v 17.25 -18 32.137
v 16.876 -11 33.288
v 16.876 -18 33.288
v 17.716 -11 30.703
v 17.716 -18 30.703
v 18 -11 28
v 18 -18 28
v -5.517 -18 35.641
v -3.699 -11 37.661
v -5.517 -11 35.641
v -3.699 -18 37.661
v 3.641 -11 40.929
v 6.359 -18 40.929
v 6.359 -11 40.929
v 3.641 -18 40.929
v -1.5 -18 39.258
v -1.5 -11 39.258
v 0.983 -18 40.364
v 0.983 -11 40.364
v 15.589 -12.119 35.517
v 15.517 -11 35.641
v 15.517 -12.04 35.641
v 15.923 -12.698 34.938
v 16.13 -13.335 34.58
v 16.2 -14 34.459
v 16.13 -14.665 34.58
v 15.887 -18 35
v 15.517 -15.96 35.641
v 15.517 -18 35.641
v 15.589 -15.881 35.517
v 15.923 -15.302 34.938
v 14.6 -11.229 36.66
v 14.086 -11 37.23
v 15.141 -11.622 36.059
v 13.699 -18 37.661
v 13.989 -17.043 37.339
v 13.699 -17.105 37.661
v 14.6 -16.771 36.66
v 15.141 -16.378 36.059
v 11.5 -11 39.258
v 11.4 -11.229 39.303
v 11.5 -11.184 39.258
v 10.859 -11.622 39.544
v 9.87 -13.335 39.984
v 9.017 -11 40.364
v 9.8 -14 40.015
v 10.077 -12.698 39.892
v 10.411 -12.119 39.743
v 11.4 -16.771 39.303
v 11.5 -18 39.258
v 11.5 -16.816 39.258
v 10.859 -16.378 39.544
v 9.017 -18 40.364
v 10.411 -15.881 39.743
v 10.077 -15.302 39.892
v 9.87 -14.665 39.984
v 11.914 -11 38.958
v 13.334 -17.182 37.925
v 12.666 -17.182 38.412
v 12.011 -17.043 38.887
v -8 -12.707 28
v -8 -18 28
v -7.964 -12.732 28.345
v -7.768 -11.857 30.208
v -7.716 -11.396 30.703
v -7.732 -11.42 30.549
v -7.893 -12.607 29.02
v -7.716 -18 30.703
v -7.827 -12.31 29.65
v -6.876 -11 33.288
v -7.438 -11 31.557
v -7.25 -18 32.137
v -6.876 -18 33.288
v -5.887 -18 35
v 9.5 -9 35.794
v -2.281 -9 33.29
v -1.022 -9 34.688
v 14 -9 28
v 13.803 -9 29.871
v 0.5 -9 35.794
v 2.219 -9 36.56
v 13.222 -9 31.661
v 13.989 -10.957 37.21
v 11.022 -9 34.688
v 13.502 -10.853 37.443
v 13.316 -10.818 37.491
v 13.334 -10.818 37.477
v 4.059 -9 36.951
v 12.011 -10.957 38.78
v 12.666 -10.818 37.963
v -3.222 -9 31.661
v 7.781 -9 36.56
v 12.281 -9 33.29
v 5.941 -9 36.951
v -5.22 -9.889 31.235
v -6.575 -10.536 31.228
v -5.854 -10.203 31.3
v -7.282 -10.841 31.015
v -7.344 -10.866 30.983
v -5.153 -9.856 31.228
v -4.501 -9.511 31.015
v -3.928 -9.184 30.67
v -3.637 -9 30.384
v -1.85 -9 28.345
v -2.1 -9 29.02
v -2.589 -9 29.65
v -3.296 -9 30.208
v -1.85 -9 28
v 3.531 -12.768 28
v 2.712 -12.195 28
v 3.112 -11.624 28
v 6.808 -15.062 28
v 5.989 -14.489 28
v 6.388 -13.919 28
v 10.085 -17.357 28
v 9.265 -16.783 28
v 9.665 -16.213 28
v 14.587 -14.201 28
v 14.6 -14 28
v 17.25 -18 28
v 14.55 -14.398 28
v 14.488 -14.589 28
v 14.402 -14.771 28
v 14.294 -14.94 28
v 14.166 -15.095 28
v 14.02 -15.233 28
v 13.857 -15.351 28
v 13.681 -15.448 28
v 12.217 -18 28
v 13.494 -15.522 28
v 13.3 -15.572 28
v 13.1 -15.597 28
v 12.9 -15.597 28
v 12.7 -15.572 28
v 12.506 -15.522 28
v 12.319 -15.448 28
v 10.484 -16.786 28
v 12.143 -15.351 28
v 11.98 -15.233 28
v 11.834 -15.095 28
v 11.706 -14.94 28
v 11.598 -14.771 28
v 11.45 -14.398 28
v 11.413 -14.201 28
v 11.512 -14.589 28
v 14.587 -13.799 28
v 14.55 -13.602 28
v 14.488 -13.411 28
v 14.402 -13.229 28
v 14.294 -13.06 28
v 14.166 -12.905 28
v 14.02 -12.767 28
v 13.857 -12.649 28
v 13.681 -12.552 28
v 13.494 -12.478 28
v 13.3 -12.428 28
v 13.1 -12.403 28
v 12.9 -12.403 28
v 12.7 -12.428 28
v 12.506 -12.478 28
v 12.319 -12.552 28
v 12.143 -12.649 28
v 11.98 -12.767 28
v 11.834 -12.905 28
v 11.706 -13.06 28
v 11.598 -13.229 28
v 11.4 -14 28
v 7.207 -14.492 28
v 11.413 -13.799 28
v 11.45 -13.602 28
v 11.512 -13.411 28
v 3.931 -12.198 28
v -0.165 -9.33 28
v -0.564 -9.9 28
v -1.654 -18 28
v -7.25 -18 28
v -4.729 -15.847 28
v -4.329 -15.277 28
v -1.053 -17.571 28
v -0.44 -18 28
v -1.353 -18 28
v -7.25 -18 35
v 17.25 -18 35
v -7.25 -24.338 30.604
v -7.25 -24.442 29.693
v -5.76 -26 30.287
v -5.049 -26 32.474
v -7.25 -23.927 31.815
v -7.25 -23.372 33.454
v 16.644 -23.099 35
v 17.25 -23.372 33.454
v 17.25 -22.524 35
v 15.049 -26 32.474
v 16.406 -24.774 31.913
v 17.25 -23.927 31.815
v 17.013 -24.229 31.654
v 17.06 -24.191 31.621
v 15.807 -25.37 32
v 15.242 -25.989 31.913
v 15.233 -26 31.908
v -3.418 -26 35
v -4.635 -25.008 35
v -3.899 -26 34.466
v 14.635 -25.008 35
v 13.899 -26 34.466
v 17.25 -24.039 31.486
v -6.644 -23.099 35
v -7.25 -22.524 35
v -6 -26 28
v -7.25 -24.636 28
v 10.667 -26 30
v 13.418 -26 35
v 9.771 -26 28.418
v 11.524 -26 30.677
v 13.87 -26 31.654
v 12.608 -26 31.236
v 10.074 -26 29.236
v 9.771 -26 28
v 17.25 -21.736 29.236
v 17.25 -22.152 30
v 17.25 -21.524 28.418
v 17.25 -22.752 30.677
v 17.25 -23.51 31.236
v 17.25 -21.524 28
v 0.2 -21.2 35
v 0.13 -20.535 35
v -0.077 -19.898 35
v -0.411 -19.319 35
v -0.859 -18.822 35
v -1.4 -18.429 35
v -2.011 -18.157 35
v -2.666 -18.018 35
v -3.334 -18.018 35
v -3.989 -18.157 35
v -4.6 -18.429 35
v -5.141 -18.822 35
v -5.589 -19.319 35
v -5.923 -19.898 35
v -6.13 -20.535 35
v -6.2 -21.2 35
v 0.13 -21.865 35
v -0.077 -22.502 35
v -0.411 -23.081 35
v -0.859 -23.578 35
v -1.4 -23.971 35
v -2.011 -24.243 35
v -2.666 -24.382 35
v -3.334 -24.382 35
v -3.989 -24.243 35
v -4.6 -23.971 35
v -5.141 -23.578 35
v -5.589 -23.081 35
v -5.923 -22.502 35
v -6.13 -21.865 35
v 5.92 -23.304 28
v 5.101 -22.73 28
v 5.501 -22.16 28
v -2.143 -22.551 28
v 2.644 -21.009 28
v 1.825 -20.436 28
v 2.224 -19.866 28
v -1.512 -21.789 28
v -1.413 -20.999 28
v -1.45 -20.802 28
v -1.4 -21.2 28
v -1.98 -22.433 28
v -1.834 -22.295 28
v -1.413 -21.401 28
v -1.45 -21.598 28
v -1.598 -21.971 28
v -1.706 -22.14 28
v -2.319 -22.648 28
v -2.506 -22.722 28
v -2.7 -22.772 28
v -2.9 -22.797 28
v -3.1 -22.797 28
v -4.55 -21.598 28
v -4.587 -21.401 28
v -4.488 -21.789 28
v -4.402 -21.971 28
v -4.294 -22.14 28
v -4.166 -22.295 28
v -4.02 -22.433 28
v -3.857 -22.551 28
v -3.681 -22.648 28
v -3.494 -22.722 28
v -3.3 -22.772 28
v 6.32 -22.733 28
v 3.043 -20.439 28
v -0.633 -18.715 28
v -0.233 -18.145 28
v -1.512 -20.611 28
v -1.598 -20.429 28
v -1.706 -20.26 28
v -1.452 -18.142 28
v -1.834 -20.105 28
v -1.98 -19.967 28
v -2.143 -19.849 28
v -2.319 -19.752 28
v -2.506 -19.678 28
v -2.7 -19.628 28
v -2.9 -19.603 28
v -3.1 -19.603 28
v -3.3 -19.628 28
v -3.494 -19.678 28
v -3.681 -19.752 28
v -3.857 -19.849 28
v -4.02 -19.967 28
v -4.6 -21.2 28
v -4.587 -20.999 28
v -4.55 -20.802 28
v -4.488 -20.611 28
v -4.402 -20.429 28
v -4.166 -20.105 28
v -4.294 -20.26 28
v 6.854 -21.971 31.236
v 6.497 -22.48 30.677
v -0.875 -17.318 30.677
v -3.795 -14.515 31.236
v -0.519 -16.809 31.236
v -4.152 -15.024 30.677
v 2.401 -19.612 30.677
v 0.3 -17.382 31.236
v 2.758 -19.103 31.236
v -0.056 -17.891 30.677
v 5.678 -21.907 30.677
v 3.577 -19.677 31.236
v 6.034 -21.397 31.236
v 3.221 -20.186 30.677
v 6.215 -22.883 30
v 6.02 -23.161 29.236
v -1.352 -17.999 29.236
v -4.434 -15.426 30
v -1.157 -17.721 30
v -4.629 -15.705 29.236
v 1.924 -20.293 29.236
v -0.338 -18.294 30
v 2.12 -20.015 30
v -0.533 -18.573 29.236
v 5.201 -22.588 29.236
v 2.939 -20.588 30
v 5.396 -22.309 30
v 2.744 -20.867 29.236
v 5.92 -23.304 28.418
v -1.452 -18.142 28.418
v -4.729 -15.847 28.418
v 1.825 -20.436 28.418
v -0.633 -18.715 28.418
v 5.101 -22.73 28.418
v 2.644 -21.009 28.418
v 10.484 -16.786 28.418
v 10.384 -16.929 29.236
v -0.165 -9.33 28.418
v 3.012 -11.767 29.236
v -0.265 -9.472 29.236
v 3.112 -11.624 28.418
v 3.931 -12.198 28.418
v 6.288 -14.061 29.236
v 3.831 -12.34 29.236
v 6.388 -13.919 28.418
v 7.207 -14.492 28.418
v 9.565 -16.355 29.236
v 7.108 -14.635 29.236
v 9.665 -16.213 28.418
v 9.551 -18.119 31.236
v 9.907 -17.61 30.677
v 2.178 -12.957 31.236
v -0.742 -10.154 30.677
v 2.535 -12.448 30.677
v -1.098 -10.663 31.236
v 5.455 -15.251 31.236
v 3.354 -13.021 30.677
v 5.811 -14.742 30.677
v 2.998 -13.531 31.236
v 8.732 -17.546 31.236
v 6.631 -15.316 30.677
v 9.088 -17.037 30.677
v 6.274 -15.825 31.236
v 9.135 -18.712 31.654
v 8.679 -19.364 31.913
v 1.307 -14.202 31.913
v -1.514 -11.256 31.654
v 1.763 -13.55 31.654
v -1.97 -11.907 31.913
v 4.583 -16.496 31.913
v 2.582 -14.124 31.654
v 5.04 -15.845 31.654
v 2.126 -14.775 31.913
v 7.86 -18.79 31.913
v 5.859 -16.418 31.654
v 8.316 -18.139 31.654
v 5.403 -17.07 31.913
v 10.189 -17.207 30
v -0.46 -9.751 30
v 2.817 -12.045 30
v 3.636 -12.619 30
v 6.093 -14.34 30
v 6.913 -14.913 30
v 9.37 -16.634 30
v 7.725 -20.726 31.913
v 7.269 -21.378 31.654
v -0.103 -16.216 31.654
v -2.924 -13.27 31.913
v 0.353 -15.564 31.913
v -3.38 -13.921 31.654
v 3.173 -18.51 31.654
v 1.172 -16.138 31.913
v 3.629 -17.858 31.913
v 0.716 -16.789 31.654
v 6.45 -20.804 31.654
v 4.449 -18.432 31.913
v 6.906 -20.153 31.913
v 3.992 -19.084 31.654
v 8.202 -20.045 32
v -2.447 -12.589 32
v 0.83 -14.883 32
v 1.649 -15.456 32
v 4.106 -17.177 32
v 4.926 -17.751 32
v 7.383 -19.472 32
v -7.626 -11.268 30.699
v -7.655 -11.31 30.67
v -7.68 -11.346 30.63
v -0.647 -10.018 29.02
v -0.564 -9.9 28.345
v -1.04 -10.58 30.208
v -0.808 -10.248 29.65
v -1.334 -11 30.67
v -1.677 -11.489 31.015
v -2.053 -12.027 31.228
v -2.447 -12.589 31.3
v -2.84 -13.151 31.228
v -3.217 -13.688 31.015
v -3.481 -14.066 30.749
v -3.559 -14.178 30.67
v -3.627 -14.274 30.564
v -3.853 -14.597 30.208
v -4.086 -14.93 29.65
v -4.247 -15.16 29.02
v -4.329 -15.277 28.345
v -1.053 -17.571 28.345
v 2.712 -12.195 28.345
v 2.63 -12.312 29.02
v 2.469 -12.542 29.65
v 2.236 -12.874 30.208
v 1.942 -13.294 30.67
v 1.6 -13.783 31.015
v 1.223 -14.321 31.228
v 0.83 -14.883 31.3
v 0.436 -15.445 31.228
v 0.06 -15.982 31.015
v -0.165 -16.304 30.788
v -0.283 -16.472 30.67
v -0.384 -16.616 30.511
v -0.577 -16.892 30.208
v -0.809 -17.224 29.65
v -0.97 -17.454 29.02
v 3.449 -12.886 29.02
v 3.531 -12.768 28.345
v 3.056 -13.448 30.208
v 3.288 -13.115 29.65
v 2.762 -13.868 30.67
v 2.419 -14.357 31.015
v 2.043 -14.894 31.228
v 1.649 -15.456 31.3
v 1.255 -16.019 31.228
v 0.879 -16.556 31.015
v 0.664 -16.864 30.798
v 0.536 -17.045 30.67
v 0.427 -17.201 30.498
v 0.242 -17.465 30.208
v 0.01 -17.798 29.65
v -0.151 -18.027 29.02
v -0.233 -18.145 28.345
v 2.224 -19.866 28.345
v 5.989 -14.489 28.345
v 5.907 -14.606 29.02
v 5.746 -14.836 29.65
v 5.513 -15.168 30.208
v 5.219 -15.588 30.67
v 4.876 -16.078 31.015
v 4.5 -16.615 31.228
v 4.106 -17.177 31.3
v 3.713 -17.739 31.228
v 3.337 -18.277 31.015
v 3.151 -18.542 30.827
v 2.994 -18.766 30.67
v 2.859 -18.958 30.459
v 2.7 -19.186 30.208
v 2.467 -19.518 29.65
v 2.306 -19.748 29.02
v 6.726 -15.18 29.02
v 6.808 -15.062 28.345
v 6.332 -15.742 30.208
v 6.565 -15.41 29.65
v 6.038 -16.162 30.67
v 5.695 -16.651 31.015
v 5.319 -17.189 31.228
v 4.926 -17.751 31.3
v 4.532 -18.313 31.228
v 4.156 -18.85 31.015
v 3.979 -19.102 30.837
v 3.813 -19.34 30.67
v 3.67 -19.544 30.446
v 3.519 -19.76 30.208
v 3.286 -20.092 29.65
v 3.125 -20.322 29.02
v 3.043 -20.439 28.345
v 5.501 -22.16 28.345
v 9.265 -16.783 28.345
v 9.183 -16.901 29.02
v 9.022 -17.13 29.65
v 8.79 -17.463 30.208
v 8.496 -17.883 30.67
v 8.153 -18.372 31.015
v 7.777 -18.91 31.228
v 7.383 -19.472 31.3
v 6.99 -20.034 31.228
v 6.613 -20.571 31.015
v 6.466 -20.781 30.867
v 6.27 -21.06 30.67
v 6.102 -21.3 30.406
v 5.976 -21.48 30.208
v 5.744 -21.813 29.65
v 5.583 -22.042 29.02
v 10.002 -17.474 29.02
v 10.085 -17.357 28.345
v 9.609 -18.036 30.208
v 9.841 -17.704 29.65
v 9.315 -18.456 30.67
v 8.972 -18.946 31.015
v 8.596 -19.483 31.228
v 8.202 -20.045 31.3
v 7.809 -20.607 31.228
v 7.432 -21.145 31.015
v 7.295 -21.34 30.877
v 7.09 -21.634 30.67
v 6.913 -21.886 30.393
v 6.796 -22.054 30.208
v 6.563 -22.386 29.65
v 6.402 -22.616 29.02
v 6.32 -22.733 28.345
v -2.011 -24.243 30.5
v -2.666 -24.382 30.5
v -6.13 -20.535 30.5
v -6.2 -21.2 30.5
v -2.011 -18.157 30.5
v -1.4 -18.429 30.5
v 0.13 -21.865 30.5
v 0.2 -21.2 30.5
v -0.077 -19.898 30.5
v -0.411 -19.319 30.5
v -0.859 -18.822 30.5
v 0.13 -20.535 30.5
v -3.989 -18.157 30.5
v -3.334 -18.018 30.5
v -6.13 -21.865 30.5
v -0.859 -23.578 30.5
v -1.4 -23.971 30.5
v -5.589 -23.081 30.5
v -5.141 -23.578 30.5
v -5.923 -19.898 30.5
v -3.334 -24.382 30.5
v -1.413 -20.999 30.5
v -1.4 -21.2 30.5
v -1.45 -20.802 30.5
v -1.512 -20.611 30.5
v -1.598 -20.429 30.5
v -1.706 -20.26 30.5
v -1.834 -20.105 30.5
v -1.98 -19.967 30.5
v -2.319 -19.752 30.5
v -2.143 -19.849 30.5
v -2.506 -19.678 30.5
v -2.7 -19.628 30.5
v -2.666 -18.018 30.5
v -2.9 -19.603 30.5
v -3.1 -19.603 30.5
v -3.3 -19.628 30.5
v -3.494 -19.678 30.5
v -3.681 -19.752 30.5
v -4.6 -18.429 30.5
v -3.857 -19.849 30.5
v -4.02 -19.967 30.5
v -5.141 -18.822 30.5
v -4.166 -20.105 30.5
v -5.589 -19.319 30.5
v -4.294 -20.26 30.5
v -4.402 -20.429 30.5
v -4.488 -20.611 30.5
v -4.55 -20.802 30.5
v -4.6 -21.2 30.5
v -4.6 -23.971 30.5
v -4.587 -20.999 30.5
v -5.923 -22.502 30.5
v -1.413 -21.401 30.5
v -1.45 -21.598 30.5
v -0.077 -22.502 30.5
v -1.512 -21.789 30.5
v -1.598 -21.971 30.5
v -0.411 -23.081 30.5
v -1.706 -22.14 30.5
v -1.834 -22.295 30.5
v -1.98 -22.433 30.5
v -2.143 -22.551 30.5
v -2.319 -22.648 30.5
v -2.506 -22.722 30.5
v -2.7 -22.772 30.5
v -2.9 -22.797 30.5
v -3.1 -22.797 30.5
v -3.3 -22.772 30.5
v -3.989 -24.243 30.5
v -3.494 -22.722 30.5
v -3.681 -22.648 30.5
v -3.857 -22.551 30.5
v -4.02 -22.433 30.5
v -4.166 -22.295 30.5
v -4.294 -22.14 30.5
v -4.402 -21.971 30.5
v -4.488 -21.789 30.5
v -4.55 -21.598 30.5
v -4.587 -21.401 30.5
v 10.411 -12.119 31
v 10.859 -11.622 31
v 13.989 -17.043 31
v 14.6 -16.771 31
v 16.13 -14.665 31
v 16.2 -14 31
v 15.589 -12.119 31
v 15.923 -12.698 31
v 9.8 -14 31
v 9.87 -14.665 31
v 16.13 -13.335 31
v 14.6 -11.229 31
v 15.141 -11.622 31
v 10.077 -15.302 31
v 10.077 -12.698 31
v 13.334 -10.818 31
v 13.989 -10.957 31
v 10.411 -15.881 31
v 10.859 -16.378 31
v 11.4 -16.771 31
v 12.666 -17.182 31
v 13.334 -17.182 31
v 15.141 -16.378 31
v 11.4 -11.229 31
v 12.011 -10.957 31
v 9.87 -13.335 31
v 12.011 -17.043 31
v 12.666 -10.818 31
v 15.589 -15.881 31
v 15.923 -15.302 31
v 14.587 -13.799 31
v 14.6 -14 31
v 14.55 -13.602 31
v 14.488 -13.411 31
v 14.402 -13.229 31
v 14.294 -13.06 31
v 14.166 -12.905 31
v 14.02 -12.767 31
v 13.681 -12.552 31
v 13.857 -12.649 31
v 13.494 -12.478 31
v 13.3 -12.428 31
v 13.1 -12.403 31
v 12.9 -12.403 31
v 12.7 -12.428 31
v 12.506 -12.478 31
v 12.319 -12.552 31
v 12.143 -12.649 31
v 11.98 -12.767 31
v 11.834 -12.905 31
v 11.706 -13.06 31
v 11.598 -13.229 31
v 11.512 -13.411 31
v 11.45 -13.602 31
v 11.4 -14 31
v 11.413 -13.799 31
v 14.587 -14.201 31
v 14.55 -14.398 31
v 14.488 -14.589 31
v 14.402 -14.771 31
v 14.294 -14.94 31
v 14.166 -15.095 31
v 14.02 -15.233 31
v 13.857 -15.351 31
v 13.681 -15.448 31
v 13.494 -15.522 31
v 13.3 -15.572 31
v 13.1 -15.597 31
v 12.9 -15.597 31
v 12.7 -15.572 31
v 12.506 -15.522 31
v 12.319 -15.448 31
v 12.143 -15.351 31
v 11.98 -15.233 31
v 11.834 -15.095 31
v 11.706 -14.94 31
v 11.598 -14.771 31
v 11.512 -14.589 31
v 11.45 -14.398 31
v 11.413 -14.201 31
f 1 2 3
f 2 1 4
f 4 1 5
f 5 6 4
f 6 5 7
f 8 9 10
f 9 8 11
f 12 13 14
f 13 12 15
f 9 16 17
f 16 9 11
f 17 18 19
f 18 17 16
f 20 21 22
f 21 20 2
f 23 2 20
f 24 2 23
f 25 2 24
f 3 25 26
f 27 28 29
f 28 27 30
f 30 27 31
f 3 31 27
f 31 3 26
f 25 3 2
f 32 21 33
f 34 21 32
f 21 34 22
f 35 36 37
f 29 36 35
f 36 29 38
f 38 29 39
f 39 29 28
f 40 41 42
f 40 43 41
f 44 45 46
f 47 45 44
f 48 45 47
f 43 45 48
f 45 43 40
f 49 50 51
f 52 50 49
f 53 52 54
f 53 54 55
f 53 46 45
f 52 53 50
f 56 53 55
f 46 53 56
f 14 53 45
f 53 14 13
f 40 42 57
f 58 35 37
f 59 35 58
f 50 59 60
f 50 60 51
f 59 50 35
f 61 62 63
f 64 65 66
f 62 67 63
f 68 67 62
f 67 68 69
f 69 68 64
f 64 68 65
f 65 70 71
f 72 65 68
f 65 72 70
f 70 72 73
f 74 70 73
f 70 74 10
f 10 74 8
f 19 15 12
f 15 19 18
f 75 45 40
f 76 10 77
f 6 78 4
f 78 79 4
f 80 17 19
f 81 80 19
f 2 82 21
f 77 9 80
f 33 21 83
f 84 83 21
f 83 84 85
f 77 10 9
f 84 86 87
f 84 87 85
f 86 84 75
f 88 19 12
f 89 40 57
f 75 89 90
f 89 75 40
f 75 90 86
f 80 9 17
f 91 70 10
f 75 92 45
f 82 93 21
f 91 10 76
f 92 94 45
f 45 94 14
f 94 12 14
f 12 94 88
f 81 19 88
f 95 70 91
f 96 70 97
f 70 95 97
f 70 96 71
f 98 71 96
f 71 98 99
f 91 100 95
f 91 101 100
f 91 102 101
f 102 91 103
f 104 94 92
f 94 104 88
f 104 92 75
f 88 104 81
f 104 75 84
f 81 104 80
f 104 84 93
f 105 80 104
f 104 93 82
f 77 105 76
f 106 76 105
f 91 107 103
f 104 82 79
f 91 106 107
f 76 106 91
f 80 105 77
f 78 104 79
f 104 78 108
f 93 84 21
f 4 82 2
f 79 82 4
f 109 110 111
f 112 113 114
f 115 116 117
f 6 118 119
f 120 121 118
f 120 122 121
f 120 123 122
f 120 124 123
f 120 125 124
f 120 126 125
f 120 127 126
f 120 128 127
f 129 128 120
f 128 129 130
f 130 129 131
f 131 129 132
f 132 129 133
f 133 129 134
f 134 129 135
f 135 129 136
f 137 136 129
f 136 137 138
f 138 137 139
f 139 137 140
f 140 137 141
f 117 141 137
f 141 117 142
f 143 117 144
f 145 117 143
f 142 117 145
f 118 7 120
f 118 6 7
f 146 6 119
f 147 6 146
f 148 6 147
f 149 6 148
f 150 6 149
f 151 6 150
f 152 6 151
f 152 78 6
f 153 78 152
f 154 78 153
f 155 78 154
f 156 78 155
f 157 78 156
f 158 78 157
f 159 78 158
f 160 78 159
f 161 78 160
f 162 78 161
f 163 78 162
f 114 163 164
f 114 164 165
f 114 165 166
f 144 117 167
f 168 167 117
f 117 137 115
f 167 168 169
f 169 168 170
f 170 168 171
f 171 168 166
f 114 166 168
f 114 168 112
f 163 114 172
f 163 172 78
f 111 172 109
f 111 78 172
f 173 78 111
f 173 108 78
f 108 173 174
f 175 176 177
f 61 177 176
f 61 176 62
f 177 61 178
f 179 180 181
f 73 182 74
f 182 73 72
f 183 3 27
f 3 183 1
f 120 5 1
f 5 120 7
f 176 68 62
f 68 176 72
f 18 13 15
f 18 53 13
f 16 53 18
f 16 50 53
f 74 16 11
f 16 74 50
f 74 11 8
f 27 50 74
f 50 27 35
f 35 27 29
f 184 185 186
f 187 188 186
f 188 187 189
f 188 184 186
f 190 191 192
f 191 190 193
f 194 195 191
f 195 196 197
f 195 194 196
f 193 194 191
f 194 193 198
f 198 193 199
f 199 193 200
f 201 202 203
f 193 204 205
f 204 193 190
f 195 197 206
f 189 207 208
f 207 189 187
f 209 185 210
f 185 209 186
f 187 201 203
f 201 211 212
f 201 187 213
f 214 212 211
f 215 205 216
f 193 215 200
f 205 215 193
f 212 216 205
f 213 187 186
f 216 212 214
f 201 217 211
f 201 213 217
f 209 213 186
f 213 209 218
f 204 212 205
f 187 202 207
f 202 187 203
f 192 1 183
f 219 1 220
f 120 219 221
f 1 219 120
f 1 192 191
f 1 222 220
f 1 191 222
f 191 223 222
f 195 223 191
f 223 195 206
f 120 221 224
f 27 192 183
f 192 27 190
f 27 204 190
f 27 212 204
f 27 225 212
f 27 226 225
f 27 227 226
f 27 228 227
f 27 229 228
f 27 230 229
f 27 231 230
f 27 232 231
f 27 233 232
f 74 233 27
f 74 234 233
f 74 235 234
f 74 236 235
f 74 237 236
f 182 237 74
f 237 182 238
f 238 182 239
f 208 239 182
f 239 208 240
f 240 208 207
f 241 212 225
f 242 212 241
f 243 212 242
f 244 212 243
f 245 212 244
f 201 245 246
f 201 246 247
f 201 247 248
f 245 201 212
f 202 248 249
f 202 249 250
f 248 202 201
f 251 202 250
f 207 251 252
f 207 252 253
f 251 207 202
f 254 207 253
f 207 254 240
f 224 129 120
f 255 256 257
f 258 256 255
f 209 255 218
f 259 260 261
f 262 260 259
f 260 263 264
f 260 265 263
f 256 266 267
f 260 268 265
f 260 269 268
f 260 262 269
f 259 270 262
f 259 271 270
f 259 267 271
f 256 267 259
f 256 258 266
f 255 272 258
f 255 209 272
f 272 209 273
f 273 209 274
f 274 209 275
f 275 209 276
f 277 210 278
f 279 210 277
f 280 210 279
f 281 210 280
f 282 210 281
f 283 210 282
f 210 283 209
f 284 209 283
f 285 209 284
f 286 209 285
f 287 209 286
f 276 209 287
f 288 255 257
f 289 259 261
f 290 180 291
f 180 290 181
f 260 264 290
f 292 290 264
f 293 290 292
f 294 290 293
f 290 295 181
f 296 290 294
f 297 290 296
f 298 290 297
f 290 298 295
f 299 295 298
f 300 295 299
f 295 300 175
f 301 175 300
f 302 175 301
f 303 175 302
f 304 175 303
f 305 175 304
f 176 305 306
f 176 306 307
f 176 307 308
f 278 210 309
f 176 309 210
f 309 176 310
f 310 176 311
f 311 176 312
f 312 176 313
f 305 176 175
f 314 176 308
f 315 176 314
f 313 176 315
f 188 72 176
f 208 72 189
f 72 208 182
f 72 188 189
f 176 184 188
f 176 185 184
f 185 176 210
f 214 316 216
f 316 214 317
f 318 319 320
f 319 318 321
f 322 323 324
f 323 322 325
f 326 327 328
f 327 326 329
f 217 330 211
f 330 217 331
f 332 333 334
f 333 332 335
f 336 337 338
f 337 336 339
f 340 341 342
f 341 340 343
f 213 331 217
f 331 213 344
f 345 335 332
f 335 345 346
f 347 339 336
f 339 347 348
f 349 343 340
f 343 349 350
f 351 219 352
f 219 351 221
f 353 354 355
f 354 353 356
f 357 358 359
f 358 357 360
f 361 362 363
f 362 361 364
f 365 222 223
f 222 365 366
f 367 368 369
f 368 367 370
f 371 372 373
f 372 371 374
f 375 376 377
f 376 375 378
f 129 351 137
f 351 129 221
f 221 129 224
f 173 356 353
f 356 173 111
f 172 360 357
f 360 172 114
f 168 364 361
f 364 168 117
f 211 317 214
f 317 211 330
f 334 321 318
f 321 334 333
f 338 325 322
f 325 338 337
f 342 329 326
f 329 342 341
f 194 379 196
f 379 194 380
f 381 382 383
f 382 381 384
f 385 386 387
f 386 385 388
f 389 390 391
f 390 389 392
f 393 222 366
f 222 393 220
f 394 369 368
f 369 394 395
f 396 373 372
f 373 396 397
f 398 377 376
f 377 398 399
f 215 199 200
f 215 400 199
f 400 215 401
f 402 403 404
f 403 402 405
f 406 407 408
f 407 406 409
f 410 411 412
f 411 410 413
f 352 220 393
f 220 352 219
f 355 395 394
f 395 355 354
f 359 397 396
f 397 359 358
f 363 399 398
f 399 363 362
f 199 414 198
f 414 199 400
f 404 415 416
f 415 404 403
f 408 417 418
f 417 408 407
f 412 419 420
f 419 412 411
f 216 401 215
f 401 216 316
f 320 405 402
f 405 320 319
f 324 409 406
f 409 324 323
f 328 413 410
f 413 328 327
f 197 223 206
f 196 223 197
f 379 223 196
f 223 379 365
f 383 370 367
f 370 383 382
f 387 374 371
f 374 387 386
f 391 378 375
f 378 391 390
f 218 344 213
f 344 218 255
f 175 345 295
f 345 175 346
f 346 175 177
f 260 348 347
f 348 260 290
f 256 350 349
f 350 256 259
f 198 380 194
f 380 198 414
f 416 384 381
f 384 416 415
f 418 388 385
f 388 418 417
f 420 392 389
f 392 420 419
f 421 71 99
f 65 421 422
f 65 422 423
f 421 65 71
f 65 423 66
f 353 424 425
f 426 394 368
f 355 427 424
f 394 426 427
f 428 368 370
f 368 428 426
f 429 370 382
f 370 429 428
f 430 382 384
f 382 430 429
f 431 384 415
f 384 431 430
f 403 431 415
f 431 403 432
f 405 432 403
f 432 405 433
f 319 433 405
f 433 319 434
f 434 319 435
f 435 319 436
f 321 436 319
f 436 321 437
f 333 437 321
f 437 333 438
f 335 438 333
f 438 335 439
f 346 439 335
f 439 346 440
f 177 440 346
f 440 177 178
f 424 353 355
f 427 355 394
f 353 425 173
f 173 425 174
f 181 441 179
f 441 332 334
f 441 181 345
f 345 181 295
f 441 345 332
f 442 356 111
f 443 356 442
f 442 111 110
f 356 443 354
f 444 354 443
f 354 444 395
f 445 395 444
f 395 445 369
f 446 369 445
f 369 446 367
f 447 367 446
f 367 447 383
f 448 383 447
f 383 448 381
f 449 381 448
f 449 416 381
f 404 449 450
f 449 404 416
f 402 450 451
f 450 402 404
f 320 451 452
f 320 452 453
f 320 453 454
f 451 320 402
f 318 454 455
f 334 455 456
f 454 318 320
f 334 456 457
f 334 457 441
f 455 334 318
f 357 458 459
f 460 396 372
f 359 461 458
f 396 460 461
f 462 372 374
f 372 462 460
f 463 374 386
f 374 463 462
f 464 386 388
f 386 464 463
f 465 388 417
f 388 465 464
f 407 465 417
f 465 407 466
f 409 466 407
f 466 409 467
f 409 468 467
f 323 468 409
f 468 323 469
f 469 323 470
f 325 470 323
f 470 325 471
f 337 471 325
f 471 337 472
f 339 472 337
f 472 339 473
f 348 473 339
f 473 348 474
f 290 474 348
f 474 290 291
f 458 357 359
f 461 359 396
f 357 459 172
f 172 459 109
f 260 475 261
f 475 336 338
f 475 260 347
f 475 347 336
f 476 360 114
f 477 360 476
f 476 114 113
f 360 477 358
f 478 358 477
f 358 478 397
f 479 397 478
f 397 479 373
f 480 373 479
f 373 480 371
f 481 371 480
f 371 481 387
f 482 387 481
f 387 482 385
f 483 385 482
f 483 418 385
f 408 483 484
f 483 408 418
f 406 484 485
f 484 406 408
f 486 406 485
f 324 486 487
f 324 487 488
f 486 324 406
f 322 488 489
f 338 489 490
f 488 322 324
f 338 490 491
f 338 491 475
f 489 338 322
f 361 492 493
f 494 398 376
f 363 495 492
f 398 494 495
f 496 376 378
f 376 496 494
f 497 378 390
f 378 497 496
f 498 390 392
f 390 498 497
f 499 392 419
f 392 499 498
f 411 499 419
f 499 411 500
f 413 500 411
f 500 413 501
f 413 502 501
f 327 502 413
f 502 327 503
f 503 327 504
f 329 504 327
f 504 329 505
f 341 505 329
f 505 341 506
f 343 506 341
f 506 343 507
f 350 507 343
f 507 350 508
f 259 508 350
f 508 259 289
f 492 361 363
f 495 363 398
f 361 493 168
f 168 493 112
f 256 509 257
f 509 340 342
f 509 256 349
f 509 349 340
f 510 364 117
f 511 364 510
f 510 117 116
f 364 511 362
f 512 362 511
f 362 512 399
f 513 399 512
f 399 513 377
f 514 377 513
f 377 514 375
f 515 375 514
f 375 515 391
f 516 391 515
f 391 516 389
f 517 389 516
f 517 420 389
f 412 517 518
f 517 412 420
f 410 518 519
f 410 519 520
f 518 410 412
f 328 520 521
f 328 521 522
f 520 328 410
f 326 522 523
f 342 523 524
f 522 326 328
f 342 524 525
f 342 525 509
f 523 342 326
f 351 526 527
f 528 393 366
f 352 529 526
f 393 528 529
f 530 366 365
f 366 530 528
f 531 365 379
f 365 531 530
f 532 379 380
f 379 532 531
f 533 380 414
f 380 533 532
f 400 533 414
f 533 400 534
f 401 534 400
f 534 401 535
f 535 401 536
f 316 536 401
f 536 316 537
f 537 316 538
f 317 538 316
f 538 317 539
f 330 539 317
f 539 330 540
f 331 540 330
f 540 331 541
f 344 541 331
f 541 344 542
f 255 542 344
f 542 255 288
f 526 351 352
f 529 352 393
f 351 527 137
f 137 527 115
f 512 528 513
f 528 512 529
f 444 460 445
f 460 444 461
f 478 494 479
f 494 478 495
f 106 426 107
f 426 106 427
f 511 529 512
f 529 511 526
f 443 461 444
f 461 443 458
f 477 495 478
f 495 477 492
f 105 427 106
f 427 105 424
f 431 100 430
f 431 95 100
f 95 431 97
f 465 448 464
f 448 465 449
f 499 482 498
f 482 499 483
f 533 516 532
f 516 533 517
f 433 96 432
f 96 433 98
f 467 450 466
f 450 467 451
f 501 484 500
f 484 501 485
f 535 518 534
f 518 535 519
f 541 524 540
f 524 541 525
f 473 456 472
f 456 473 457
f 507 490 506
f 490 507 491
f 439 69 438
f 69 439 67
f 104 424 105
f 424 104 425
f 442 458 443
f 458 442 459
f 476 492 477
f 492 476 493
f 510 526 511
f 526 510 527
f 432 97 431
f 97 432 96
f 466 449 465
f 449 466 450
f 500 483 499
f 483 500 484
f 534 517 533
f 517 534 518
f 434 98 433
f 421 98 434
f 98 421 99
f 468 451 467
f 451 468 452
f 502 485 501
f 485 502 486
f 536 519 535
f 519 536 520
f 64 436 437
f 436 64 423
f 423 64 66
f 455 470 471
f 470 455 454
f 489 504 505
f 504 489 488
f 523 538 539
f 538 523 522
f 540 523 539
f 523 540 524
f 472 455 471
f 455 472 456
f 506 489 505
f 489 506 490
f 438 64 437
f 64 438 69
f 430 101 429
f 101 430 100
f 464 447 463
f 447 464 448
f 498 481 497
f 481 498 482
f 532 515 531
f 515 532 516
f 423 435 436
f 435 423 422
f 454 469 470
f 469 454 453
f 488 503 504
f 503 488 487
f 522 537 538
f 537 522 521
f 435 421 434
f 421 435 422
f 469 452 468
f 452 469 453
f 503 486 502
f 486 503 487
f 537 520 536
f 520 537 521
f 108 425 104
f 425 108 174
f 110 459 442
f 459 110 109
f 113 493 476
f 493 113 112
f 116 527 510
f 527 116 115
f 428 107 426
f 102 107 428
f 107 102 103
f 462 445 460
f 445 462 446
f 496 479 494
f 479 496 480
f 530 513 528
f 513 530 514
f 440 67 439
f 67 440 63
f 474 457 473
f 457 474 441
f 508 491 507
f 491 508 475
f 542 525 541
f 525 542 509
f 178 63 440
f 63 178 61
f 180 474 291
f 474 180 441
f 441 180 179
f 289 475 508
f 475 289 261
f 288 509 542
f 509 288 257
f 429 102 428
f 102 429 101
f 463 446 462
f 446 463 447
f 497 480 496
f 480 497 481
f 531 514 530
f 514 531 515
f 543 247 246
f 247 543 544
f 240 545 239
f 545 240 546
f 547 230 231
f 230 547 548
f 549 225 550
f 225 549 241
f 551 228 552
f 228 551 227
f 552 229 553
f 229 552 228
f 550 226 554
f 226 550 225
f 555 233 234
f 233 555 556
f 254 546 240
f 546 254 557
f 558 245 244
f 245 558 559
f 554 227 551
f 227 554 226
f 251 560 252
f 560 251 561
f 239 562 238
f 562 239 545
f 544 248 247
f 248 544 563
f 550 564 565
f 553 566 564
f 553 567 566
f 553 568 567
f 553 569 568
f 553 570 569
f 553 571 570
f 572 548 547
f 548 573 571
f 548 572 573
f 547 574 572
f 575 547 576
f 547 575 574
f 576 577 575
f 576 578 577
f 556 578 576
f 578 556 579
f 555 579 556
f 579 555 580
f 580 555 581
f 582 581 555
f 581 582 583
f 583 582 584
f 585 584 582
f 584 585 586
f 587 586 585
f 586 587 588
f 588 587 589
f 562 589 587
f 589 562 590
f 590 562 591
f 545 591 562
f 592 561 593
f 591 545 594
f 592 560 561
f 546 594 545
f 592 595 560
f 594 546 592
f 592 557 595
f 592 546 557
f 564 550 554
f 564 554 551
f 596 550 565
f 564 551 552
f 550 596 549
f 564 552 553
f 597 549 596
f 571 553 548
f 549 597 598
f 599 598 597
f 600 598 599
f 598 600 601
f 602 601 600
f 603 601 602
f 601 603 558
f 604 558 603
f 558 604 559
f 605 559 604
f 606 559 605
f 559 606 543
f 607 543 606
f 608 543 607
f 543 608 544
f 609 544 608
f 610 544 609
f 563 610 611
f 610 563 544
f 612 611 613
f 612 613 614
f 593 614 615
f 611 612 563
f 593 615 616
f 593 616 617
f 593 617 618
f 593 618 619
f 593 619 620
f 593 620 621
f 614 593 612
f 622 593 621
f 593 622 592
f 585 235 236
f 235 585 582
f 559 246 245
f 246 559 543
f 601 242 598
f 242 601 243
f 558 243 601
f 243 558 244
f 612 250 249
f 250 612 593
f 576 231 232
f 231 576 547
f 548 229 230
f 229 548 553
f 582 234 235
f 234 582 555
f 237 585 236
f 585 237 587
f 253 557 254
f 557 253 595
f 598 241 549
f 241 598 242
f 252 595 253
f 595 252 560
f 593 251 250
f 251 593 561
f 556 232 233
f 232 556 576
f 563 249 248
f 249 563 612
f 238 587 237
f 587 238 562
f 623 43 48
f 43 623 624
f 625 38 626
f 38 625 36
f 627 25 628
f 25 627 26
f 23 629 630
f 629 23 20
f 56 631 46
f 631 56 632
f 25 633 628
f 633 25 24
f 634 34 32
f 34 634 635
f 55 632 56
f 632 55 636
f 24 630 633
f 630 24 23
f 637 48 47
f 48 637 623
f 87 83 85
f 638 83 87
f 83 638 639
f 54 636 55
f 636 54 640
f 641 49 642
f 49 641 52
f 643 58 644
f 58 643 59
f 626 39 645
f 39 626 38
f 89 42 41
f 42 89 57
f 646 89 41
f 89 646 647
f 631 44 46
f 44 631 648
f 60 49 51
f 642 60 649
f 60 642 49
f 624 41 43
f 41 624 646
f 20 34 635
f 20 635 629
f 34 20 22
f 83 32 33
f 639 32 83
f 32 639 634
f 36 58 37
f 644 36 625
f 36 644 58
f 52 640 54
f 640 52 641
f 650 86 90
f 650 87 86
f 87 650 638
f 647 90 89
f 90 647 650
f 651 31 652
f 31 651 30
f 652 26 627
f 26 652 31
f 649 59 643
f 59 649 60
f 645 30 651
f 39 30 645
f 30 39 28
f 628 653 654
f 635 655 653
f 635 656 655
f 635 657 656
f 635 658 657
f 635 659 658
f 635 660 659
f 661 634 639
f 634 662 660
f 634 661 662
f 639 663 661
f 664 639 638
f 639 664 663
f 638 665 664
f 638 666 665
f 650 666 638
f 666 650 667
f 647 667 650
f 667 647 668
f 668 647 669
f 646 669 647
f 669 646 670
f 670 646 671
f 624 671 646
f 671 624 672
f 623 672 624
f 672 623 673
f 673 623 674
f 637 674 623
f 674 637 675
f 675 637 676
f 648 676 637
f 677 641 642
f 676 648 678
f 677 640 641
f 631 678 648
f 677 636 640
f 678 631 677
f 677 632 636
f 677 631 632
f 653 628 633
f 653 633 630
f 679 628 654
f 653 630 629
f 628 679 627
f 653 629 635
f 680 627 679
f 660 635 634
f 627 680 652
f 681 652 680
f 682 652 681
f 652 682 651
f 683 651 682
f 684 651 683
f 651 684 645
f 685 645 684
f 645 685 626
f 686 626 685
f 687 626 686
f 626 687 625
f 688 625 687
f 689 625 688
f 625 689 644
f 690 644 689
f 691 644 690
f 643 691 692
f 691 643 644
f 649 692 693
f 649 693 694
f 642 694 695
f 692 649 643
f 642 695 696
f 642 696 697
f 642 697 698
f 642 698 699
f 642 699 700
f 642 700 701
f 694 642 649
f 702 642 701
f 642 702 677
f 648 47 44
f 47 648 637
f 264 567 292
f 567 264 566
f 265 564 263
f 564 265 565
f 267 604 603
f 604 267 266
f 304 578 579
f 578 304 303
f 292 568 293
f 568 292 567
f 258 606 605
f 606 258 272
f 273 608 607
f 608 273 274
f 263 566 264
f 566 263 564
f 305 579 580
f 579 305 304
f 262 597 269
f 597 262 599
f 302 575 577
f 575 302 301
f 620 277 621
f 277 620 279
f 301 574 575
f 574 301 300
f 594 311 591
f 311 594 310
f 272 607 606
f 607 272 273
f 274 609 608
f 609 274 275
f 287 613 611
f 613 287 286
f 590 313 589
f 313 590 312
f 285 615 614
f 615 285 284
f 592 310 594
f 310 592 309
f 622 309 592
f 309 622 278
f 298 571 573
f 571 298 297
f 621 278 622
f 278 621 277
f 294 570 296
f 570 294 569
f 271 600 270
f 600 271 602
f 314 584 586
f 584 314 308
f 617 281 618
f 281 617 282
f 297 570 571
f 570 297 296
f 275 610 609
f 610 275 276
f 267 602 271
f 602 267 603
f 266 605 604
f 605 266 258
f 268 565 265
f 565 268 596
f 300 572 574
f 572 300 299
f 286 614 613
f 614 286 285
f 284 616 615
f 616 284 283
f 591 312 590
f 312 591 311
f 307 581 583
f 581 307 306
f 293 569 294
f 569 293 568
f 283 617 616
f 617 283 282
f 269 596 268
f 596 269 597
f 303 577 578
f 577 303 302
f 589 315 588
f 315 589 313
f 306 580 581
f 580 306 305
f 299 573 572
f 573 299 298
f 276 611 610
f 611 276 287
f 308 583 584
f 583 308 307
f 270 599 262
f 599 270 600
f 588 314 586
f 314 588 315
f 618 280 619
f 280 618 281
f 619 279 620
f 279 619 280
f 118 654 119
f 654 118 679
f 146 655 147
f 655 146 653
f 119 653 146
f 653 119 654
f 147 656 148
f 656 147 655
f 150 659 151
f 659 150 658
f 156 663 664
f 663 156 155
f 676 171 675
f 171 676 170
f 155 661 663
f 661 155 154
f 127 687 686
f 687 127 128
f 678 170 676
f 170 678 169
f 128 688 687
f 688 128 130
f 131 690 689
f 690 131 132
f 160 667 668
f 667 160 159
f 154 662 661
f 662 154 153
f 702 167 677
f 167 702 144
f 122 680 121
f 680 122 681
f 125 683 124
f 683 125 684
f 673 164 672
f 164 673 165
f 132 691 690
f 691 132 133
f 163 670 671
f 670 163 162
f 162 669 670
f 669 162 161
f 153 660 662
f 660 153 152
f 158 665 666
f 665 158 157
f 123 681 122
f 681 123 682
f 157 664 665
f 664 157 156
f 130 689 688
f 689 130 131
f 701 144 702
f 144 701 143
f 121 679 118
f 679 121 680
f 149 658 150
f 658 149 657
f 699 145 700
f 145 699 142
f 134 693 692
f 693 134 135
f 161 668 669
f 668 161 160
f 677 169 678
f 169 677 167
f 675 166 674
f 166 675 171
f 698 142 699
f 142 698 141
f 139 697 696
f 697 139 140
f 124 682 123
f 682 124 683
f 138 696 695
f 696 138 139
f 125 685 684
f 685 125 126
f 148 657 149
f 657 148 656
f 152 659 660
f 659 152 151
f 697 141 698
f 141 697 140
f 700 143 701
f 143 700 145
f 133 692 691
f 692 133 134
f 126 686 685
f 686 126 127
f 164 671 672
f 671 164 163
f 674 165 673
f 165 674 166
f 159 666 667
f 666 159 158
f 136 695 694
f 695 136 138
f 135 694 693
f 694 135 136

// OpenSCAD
// PRUSA iteration4
// Heatbed cable clip
// GNU GPL v3
// Josef Průša <iam@josefprusa.cz> and contributors
// http://www.reprap.org/wiki/Prusa_Mendel
// http://prusamendel.org

module heatbed_cable_clip(){
    difference(){
        union(){
            difference(){
                union(){
                    // Body base
                    translate([75,99,28]) rotate([90,0,0]) cylinder(h=15,r=13,$fn=30);
                    translate([75,101,28]) rotate([90,0,0]) cylinder(h=2,r1=9,r2=13,$fn=30);
                }

                // Cut flat and shape
                translate([60,82,14]) cube([30,20,14]);
                translate([60,72,20]) cube([30,20,30]);
            }
            difference(){
                translate([62.75,84,28]) cube([24.5,8,7]);
                difference(){
                    translate([75,85,28]) rotate([90,0,0]) cube([30,20,10],center=true);
                    translate([75,90,28]) rotate([90,0,0]) cylinder(h=6,r1=16.5,r2=11,$fn=30);
                }
            }
        }

        // Cable opening
        translate([61,102,28]) rotate([35,90,0])

        difference(){
            cylinder(h=35,r=4,$fn=30);

            translate([0,0,3]) cylinder(h=5,r=4,$fn=30);
            translate([0,0,12]) cylinder(h=1,r=4,$fn=30);
            translate([0,0,16]) cylinder(h=1,r=4,$fn=30);
            translate([0,0,20]) cylinder(h=1,r=4,$fn=30);
        }
        translate([61,102,28]) rotate([35,90,0]) cylinder(h=35,r=3.3,$fn=30);

        // Screw heads
        translate([67,88.8,30.5]) rotate([0,0,0]) cylinder(h=10,r=3.2,$fn=30);
        translate([83,96,31]) rotate([0,0,0]) cylinder(h=10,r=3.2,$fn=30);

        // Screws
        translate([67,88.8,14]) rotate([0,0,0]) cylinder(h=35,r=1.6,$fn=50);
        translate([83,96,14]) rotate([0,0,0]) cylinder(h=35,r=1.6,$fn=50);
    }
}

translate([-70,-110,0]) heatbed_cable_clip();
